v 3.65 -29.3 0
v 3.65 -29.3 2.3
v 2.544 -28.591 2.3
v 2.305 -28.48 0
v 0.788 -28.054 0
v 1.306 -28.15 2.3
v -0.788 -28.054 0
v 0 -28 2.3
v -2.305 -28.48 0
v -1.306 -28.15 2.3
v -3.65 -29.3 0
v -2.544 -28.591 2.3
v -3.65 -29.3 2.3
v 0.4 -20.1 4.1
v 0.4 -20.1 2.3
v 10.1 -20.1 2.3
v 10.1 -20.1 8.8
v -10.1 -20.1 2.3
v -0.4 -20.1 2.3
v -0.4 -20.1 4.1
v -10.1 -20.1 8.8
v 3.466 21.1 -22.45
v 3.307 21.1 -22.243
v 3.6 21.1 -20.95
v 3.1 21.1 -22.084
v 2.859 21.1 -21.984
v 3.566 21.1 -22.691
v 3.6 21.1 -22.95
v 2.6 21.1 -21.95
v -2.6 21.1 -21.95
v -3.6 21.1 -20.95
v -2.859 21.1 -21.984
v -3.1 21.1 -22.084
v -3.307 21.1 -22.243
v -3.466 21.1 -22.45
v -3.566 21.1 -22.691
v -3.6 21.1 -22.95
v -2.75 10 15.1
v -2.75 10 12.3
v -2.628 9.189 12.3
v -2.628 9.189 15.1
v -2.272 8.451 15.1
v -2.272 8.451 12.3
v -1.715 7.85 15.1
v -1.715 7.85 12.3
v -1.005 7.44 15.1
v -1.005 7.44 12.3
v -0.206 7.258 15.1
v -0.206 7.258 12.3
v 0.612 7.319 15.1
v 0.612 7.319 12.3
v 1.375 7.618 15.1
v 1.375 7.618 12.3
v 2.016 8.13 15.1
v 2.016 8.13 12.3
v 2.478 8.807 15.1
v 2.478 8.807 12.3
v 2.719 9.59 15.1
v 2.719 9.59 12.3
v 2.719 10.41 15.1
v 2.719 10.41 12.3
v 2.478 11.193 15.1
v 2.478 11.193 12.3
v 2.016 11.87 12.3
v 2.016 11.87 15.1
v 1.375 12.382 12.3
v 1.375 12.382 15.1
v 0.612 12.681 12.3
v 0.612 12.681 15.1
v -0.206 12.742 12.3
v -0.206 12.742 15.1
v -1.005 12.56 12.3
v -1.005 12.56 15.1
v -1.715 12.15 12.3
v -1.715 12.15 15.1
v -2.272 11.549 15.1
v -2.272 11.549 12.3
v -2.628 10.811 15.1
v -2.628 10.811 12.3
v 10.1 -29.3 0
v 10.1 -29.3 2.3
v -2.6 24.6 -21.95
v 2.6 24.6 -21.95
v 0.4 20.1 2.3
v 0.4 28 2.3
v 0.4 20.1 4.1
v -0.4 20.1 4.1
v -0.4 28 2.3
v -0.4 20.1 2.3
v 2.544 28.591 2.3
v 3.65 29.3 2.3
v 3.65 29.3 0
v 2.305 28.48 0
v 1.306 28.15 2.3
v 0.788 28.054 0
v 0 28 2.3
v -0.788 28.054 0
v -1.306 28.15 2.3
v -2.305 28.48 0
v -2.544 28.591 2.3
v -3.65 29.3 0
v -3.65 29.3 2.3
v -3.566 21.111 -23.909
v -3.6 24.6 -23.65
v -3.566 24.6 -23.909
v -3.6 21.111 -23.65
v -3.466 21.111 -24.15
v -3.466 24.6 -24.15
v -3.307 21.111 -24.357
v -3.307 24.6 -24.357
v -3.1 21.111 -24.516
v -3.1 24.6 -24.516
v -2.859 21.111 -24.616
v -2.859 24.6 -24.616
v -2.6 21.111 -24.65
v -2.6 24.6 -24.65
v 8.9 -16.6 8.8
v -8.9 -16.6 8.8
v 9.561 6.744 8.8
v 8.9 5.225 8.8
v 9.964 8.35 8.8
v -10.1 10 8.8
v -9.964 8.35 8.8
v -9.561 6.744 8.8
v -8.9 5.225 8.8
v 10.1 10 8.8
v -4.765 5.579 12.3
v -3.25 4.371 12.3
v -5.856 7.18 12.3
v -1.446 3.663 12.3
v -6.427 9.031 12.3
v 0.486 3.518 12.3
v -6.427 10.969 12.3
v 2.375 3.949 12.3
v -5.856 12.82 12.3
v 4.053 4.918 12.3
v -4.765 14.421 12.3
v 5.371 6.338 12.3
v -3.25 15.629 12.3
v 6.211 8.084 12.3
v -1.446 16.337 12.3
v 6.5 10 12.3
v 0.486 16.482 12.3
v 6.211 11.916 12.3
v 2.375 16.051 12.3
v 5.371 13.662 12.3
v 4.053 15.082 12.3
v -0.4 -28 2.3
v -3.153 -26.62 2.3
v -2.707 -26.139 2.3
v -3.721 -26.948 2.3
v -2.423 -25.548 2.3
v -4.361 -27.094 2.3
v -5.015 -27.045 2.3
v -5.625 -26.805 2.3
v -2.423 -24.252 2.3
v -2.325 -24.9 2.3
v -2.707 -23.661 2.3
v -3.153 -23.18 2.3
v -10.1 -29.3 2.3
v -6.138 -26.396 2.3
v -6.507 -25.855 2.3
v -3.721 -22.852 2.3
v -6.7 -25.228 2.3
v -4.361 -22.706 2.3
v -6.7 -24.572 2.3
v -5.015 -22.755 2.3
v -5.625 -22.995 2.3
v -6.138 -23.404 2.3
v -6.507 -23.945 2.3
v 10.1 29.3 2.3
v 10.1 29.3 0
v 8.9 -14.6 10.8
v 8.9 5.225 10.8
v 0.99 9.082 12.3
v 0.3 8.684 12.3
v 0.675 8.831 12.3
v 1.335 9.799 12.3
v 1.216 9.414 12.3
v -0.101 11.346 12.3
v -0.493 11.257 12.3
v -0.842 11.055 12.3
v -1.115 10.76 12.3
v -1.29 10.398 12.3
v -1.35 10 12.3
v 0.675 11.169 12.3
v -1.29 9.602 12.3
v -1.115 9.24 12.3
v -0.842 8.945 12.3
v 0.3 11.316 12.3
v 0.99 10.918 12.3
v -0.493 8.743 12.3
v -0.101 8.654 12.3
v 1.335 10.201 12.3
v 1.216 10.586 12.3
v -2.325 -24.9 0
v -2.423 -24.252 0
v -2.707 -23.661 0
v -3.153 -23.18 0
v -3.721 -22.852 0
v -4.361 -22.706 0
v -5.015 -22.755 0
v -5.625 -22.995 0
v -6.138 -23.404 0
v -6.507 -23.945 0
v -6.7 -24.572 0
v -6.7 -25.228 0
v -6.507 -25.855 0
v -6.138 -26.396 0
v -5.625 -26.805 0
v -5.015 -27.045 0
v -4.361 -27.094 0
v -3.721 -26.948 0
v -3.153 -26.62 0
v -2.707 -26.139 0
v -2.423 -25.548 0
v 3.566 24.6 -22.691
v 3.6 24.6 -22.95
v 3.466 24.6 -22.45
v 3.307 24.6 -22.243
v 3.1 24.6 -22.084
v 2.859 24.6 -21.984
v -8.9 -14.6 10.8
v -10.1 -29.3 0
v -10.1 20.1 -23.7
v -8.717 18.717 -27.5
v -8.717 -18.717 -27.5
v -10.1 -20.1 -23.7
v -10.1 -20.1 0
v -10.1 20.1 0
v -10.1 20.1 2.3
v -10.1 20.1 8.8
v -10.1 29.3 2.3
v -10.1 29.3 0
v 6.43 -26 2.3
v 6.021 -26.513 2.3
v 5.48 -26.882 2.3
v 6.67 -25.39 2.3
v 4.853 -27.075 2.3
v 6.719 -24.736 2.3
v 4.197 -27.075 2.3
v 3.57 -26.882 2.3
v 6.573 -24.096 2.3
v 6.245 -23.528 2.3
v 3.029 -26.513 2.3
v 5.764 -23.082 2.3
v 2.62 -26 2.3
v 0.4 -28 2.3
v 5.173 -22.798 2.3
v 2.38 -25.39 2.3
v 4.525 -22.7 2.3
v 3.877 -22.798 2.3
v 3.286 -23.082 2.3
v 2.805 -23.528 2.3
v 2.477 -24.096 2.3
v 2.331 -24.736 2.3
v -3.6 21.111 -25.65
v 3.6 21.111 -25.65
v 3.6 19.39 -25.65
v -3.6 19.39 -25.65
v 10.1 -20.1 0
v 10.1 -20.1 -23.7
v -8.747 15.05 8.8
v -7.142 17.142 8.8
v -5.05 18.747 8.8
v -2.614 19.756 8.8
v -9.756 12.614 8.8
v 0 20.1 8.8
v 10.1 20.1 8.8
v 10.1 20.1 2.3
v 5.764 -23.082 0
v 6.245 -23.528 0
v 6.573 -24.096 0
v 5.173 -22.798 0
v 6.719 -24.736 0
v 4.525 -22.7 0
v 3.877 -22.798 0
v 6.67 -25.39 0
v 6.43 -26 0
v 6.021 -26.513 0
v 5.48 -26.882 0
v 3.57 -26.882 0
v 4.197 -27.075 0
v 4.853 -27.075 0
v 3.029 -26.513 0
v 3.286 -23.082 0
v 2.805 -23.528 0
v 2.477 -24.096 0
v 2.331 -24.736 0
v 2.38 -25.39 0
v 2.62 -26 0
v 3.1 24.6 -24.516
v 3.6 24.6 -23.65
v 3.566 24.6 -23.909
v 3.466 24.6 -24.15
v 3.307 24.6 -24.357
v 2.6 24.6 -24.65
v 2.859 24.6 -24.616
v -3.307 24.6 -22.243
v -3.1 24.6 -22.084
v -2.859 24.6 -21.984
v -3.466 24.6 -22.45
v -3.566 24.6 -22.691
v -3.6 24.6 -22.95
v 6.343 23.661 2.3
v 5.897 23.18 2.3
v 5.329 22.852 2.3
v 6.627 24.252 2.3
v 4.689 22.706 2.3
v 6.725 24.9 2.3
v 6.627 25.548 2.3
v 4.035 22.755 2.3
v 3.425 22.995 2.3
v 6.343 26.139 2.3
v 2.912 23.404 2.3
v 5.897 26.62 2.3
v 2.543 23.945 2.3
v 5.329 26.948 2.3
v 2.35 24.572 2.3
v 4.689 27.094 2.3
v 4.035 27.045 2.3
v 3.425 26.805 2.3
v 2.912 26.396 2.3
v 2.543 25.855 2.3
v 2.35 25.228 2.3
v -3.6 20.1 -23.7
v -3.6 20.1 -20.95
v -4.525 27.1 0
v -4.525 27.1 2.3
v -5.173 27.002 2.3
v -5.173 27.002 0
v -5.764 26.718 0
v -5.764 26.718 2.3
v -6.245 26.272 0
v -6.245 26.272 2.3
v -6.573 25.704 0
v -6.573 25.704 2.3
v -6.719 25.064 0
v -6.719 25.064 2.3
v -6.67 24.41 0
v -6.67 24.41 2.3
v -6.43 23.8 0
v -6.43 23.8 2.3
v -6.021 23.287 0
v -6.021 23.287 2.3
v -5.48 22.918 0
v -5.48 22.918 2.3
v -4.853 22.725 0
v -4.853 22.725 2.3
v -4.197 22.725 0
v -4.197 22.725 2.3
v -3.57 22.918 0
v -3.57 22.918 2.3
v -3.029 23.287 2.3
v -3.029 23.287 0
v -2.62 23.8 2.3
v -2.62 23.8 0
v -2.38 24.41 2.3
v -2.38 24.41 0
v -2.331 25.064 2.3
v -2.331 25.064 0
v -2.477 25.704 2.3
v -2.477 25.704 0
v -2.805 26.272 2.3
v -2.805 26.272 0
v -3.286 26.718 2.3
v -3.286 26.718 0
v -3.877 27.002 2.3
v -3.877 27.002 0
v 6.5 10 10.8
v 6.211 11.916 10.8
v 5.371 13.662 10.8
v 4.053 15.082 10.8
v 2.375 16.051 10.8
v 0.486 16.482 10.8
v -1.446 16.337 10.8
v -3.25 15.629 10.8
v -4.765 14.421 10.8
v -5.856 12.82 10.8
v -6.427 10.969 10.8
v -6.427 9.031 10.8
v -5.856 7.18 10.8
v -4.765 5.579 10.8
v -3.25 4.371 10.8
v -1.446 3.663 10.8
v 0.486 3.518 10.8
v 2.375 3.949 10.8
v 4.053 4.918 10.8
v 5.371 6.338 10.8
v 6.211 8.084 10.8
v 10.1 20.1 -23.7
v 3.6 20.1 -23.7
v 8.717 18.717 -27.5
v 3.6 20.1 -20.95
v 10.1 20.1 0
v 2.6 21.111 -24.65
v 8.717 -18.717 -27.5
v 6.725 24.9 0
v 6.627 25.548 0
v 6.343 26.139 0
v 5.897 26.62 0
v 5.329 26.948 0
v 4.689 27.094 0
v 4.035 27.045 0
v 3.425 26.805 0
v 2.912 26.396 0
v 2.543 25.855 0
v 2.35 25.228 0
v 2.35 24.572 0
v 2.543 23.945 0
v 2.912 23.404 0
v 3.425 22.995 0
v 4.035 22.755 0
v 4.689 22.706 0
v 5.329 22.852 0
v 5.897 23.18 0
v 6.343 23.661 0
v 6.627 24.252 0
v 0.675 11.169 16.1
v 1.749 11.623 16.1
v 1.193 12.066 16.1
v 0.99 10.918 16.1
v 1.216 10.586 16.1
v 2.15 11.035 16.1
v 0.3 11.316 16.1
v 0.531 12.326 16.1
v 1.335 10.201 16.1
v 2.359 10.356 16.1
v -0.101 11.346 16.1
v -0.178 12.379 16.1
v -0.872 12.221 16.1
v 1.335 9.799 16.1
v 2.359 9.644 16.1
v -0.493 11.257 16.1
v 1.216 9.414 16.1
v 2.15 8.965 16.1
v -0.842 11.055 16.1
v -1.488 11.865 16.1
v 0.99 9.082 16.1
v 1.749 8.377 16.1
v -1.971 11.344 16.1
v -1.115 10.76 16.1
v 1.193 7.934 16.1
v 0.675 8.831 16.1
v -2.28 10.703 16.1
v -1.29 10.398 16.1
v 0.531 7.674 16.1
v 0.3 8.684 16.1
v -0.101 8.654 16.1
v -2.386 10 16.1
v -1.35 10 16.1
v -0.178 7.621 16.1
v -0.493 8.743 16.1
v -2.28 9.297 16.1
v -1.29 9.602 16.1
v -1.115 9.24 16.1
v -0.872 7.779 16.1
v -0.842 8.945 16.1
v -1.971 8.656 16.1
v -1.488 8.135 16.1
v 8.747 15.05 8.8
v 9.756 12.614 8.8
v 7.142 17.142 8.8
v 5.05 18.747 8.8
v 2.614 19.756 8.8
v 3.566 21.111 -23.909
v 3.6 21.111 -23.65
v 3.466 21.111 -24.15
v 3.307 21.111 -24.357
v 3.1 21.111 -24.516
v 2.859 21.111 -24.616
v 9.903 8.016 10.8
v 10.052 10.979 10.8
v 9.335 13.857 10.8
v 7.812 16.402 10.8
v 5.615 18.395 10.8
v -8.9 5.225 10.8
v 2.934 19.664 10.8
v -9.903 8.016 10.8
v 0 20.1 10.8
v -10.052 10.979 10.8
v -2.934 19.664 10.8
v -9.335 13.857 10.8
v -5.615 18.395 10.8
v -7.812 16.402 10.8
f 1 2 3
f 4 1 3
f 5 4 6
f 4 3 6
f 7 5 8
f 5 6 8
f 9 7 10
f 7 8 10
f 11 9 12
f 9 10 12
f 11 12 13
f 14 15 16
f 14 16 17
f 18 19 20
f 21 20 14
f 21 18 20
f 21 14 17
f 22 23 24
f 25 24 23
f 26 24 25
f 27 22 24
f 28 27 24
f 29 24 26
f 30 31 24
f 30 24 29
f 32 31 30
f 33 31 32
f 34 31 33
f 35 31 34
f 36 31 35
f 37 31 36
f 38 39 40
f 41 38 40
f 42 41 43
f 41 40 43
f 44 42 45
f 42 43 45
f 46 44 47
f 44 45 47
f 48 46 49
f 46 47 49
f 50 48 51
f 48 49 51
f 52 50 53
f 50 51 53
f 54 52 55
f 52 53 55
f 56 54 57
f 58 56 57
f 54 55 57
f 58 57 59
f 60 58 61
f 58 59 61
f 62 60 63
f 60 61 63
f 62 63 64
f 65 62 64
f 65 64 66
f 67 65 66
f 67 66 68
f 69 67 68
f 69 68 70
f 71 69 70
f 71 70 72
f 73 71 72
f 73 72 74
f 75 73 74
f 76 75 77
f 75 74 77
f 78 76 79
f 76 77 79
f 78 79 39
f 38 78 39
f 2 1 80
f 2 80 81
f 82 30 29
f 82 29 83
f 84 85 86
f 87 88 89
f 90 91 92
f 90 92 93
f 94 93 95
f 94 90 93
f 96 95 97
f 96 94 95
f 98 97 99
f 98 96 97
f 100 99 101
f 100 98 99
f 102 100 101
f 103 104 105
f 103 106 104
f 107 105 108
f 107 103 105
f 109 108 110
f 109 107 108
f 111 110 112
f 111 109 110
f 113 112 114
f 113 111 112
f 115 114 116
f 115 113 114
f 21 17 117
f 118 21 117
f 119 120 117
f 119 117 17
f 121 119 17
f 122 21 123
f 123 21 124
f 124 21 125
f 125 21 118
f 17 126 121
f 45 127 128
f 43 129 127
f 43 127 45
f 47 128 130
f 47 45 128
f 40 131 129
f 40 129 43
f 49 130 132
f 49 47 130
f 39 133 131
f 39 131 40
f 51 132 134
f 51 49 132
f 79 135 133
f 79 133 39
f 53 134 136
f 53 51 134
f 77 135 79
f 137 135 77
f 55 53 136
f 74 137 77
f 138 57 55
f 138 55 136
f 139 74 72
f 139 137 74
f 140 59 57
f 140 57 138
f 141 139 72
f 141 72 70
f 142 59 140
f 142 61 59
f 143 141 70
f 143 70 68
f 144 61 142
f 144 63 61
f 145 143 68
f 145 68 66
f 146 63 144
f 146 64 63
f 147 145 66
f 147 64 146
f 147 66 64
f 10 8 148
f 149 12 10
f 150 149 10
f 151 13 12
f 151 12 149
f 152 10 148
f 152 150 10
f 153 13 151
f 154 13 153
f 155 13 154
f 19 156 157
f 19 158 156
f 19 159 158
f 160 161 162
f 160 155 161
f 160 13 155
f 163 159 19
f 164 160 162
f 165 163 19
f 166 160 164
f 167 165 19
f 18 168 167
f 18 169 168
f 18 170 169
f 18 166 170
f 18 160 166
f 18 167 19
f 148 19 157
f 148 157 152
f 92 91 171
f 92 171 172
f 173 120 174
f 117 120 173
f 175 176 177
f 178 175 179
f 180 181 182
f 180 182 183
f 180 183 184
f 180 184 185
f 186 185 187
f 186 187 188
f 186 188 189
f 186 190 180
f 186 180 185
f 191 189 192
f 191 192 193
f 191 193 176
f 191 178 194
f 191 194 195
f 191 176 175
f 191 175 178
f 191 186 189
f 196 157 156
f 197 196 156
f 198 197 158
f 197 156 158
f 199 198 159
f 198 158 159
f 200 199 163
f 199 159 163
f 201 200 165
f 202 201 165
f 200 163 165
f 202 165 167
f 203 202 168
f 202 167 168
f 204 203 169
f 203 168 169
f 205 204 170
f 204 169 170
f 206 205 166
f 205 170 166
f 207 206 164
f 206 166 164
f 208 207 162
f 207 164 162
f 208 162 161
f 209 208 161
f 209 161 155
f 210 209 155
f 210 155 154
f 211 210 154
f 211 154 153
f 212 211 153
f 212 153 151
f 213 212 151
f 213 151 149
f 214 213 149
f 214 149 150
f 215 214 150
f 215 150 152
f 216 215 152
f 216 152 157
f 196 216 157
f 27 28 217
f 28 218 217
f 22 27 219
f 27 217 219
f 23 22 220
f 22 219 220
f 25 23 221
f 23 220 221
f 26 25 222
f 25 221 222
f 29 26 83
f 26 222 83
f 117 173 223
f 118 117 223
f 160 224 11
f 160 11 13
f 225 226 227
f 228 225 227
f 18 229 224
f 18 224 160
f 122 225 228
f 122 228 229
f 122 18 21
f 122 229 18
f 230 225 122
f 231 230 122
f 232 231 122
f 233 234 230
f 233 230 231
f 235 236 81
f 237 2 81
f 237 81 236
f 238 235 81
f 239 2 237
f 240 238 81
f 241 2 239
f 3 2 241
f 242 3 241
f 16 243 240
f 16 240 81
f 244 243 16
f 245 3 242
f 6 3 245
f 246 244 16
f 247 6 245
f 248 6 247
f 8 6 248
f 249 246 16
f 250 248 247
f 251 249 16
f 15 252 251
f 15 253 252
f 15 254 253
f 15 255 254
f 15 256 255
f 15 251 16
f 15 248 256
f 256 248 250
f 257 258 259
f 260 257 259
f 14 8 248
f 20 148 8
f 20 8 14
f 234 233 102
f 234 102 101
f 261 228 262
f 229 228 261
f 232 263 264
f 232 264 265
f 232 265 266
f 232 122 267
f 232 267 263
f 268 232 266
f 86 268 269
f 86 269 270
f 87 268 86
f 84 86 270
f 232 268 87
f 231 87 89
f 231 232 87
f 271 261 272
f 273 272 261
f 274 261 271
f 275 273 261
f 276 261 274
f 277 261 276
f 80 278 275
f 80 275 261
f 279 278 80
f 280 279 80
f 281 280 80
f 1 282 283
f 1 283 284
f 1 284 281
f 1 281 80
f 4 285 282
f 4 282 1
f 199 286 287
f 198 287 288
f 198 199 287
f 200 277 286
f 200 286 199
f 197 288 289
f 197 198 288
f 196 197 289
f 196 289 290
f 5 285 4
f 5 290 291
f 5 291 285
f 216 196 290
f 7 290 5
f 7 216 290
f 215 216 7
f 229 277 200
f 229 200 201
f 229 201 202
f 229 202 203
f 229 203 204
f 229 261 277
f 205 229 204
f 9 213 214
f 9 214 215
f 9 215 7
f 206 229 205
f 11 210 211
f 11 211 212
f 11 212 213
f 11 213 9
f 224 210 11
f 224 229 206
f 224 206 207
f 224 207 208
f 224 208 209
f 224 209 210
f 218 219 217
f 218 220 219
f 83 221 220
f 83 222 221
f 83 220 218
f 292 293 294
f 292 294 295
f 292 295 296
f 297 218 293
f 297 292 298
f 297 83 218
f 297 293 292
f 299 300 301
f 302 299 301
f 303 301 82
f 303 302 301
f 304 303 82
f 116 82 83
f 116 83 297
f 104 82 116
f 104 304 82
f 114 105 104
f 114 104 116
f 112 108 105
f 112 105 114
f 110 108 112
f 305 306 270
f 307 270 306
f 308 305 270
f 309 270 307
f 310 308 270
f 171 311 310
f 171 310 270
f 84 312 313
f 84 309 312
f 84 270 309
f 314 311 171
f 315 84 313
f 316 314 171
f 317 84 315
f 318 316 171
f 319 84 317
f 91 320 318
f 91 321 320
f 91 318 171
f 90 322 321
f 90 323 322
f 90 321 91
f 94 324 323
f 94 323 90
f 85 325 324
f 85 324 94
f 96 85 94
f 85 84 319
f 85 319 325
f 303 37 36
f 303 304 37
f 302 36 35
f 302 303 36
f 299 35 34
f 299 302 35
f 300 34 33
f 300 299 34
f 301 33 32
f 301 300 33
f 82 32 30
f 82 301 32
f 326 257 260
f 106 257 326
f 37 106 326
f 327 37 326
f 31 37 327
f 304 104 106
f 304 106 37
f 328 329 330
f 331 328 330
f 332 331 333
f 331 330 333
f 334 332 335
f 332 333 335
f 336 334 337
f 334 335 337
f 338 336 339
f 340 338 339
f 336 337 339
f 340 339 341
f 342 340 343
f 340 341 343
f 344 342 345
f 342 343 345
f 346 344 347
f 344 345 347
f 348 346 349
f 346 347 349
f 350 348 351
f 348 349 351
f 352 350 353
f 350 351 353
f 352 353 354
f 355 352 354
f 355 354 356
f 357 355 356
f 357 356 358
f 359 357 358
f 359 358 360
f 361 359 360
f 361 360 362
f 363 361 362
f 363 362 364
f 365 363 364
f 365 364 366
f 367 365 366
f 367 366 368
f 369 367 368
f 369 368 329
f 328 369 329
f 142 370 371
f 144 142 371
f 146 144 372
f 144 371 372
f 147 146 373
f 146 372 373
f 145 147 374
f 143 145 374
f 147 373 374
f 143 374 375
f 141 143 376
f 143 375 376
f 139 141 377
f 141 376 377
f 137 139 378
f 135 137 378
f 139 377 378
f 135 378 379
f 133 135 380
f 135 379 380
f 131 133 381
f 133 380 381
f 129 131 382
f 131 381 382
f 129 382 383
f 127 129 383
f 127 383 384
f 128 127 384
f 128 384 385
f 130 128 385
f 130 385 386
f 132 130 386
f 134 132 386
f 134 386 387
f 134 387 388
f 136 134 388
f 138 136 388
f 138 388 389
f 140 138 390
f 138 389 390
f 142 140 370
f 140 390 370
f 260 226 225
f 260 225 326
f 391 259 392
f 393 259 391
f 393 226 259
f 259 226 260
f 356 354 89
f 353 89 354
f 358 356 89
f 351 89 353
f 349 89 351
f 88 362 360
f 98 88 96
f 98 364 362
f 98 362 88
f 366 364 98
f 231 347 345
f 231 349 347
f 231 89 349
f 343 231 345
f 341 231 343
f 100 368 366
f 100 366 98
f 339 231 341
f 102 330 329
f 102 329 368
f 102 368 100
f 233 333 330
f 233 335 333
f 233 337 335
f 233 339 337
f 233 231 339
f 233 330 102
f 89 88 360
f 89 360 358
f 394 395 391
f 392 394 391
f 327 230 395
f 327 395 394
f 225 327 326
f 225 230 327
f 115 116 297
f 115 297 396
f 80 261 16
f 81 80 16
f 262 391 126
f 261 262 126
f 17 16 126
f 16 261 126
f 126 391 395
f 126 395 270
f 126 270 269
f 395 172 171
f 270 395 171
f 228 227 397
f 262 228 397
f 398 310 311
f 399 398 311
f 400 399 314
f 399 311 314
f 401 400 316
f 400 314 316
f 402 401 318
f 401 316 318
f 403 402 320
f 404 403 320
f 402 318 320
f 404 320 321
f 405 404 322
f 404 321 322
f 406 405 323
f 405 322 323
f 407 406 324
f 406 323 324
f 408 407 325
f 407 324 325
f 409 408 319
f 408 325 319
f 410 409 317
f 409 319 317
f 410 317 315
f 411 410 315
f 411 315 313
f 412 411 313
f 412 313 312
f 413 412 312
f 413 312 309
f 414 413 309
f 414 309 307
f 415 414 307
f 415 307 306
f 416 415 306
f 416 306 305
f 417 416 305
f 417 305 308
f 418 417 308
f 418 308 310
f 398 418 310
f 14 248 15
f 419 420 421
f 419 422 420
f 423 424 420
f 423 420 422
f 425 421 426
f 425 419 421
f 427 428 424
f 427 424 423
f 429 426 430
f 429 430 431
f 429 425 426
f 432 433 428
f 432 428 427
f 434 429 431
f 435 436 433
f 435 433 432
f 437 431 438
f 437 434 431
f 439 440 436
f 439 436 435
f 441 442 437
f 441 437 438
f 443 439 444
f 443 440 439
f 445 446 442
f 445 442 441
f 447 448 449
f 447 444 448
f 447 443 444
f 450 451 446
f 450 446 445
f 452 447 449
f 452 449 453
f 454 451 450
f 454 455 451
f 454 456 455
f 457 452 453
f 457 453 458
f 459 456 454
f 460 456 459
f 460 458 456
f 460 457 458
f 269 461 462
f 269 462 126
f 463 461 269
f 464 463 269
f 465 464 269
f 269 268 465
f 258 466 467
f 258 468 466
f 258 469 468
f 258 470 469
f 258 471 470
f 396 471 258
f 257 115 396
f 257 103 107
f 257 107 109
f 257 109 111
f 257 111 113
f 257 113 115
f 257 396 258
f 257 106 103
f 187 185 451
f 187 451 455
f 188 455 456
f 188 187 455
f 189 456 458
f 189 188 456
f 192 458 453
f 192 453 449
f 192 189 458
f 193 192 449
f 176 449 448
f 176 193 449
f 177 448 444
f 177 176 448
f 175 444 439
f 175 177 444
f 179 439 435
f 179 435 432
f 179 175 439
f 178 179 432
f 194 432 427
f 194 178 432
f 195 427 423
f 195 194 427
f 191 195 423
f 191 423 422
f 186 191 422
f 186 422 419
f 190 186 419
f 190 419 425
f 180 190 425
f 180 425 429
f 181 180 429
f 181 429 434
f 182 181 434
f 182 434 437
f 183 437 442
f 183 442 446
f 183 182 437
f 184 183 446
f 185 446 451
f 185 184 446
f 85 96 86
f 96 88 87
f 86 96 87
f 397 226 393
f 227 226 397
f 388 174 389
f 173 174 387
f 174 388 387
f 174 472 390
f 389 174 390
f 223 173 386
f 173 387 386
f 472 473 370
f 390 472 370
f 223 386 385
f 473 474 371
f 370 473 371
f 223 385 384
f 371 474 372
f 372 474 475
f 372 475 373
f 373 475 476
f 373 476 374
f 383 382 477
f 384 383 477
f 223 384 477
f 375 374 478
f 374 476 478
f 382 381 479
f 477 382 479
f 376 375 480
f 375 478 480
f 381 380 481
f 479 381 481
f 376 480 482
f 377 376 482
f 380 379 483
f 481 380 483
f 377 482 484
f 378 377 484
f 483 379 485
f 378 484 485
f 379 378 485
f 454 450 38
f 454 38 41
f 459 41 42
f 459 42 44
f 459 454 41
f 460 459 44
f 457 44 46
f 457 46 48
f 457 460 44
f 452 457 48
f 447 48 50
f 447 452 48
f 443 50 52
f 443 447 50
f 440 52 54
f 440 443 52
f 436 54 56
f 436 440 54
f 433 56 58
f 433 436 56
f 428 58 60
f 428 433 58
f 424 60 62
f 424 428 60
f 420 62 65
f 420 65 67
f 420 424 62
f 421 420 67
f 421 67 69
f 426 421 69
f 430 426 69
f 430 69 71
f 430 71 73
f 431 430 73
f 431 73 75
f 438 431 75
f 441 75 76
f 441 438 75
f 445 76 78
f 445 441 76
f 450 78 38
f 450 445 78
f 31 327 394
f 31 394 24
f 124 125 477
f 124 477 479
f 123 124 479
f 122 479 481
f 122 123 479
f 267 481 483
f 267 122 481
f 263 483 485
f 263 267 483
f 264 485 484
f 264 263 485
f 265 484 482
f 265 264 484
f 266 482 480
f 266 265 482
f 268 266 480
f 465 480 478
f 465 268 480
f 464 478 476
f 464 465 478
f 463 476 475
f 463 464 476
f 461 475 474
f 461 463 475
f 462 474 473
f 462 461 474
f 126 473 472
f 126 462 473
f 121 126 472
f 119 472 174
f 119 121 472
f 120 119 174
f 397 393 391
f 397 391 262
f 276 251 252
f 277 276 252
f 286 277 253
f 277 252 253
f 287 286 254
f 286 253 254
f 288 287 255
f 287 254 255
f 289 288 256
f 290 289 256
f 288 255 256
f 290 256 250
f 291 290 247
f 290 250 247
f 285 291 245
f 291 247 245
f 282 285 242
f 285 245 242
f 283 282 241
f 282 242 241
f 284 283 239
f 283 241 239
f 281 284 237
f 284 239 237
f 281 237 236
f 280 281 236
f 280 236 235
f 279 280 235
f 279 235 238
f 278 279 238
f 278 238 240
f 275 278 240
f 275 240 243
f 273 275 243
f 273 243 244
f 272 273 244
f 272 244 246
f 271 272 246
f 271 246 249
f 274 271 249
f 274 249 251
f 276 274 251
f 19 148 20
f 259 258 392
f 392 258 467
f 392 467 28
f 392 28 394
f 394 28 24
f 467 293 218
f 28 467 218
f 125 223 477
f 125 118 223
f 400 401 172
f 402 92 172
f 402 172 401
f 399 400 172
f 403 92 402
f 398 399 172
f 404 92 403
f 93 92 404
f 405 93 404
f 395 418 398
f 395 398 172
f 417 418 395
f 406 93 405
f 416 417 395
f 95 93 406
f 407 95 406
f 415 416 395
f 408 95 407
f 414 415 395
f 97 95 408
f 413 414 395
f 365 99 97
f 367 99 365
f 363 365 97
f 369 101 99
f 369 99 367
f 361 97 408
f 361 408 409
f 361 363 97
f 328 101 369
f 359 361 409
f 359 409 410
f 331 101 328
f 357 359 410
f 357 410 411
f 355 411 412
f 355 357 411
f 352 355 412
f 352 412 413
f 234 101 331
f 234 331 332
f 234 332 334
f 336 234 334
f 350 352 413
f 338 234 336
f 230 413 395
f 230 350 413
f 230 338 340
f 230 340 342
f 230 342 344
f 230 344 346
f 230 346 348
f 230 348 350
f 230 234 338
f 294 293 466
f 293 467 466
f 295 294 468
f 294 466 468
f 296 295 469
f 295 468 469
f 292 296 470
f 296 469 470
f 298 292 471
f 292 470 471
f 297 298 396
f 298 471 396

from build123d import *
from OCP.BRepFilletAPI import BRepFilletAPI_MakeChamfer

# Parameters (mm, degrees)
BOSS_EXTRUDE1_DEPTH      = 10.1
BOSS_EXTRUDE1_DEPTH_BACK = 10.1
CUT_EXTRUDE1_REACH       = 44.995
SKETCH2_R                = 2.2
RIB3_REACH               = 43.434
SKETCH3_WALL_W           = 92.969832662
SKETCH3_WALL_H           = 0.8
BOSS_EXTRUDE2_DEPTH      = 2
CHAMFER1_SIZE            = 2
SKETCH5_R                = 6.5
BOSS_EXTRUDE3_DEPTH      = 1.5
CHAMFER2_SIZE            = 3.8
CHAMFER2_SIZE2           = 1.38308689
BOSS_EXTRUDE4_DEPTH      = 3.6
BOSS_EXTRUDE4_DEPTH_BACK = 3.6
FILLET2_R                = 1
SKETCH7_R                = 2.75
SKETCH7_R_2              = 1.35
BOSS_EXTRUDE5_DEPTH      = 3.8
CHAMFER3_SIZE            = 1
CHAMFER3_SIZE2           = 0.363970234


with BuildPart() as part:
    # Sketch1 → Boss-Extrude1 (new, two sides: drawn at the far end of the back side and taken through both)
    with BuildSketch(Plane(origin=(0, 0, 0), x_dir=(0, 0, -1), z_dir=(1, 0, 0)).offset(-BOSS_EXTRUDE1_DEPTH_BACK)):
        Polygon((-8.8, -20.1), (-8.8, 20.1), (-2.3, 20.1), (-2.3, 29.3), (0, 29.3), (0, 20.1), (27.5, 20.1), (27.5, -20.1), (0, -20.1), (0, -29.3), (-2.3, -29.3), (-2.3, -20.1), align=None)
    extrude(amount=BOSS_EXTRUDE1_DEPTH + BOSS_EXTRUDE1_DEPTH_BACK)

    # Sketch2 → Cut-Extrude1 (cut, up to next)
    with BuildSketch(Plane.XY.offset(2.3), mode=Mode.PRIVATE) as cut_extrude1_sk1:
        with Locations((4.525, 24.9)):
            Circle(SKETCH2_R)
    cut_extrude1_tool1 = extrude(cut_extrude1_sk1.sketch, amount=-CUT_EXTRUDE1_REACH, mode=Mode.PRIVATE) & part.part
    # Sketch2 → Cut-Extrude1 (cut, up to next)
    with BuildSketch(Plane.XY.offset(2.3), mode=Mode.PRIVATE) as cut_extrude1_sk2:
        with Locations(Location((-4.525, 24.9, 0), (0, 0, 90))):
            Circle(SKETCH2_R)
    cut_extrude1_tool2 = extrude(cut_extrude1_sk2.sketch, amount=-CUT_EXTRUDE1_REACH, mode=Mode.PRIVATE) & part.part
    # Sketch2 → Cut-Extrude1 (cut, up to next)
    with BuildSketch(Plane.XY.offset(2.3), mode=Mode.PRIVATE) as cut_extrude1_sk3:
        with Locations((-4.525, -24.9)):
            Circle(SKETCH2_R)
    cut_extrude1_tool3 = extrude(cut_extrude1_sk3.sketch, amount=-CUT_EXTRUDE1_REACH, mode=Mode.PRIVATE) & part.part
    # Sketch2 → Cut-Extrude1 (cut, up to next)
    with BuildSketch(Plane.XY.offset(2.3), mode=Mode.PRIVATE) as cut_extrude1_sk4:
        with Locations(Location((4.525, -24.9, 0), (0, 0, 90))):
            Circle(SKETCH2_R)
    cut_extrude1_tool4 = extrude(cut_extrude1_sk4.sketch, amount=-CUT_EXTRUDE1_REACH, mode=Mode.PRIVATE) & part.part
    # Sketch2 → Cut-Extrude1 (cut, up to next)
    with BuildSketch(Plane.XY.offset(2.3), mode=Mode.PRIVATE) as cut_extrude1_sk5:
        with BuildLine():
            Line((-3.65, 29.3), (3.65, 29.3))
            ThreePointArc((3.65, 29.3), (0, 28), (-3.65, 29.3))
        make_face()
    cut_extrude1_tool5 = extrude(cut_extrude1_sk5.sketch, amount=-CUT_EXTRUDE1_REACH, mode=Mode.PRIVATE) & part.part
    # Sketch2 → Cut-Extrude1 (cut, up to next)
    with BuildSketch(Plane.XY.offset(2.3), mode=Mode.PRIVATE) as cut_extrude1_sk6:
        with BuildLine():
            Line((-3.65, -29.3), (3.65, -29.3))
            ThreePointArc((3.65, -29.3), (0, -28), (-3.65, -29.3))
        make_face()
    cut_extrude1_tool6 = extrude(cut_extrude1_sk6.sketch, amount=-CUT_EXTRUDE1_REACH, mode=Mode.PRIVATE) & part.part
    add(cut_extrude1_tool1.solids().sort_by_distance((4.525, 24.9, 2.3))[0], mode=Mode.SUBTRACT)
    add(cut_extrude1_tool2.solids().sort_by_distance((-4.525, 24.9, 2.3))[0], mode=Mode.SUBTRACT)
    add(cut_extrude1_tool3.solids().sort_by_distance((-4.525, -24.9, 2.3))[0], mode=Mode.SUBTRACT)
    add(cut_extrude1_tool4.solids().sort_by_distance((4.525, -24.9, 2.3))[0], mode=Mode.SUBTRACT)
    add(cut_extrude1_tool5.solids().sort_by_distance((0, 28.774631, 2.3))[0], mode=Mode.SUBTRACT)
    add(cut_extrude1_tool6.solids().sort_by_distance((0, -28.774631, 2.3))[0], mode=Mode.SUBTRACT)

    # Sketch3 wall → Rib3 (add, up to next)
    with BuildSketch(Plane(origin=(0, 24.05, 3.2), x_dir=(0, -0.975011472973, 0.222154512829), z_dir=(0, -0.222154512829, -0.975011472973)), mode=Mode.PRIVATE) as rib3_sk1:
        Rectangle(SKETCH3_WALL_W, SKETCH3_WALL_H)
    rib3_tool1 = extrude(rib3_sk1.sketch, amount=RIB3_REACH, mode=Mode.PRIVATE) - part.part
    rib3 = rib3_tool1.solids().sort_by_distance((0, 24.05, 3.2))[0]
    add(rib3)

    # Mirror1: Rib3 across plane
    add(rib3.mirror(Plane.ZX))

    # Sketch4 → Boss-Extrude2 (add)
    with BuildSketch(Plane.XY.offset(8.8)):
        with BuildLine():
            Line((8.9, 5.225065445), (8.9, -16.6))
            Line((8.9, -16.6), (-8.9, -16.6))
            Line((-8.9, -16.6), (-8.9, 5.225065445))
            ThreePointArc((-8.9, 5.225065445), (0, 20.1), (8.9, 5.225065445))
        make_face()
    extrude(amount=BOSS_EXTRUDE2_DEPTH)

    # Chamfer1
    chamfer1_edges = [part.edges().sort_by_distance(p)[0] for p in [
        (0, -16.6, 10.8),
    ]]
    chamfer(chamfer1_edges, length=CHAMFER1_SIZE - 0.0001)  # a hair under: the kernel refuses the full size

    # Sketch5 → Boss-Extrude3 (add)
    with BuildSketch(Plane.XY.offset(10.8)):
        with Locations((0, 10)):
            Circle(SKETCH5_R)
    extrude(amount=BOSS_EXTRUDE3_DEPTH)

    # Chamfer2: one chamfer whose edges measure the first distance from different faces: ONE call of the kernel's chamfer builder (chamfer() names one face for all edges)
    chamfer2_edges_1 = [part.edges().sort_by_distance(p)[0] for p in [
        (-10.1, 0, -27.5),
    ]]
    chamfer2_side_1 = [part.faces().sort_by_distance(p)[0] for p in [
        (-10.1, 0, -9.054071711),
    ]]
    chamfer2_edges_2 = [part.edges().sort_by_distance(p)[0] for p in [
        (0, 20.1, -27.5),
    ]]
    chamfer2_side_2 = [part.faces().sort_by_distance(p)[0] for p in [
        (0, 20.1, -13.75),
    ]]
    chamfer2_edges_3 = [part.edges().sort_by_distance(p)[0] for p in [
        (0, -20.1, -27.5),
    ]]
    chamfer2_side_3 = [part.faces().sort_by_distance(p)[0] for p in [
        (0, -20.1, -13.75),
    ]]
    chamfer2_edges_4 = [part.edges().sort_by_distance(p)[0] for p in [
        (10.1, 0, -27.5),
    ]]
    chamfer2_side_4 = [part.faces().sort_by_distance(p)[0] for p in [
        (10.1, 0, -9.054071711),
    ]]
    chamfer2 = BRepFilletAPI_MakeChamfer(part.part.solid().wrapped)
    for e in chamfer2_edges_1:
        chamfer2.Add(CHAMFER2_SIZE, CHAMFER2_SIZE2, e.wrapped, chamfer2_side_1[0].wrapped)  # the first distance lies on this face
    for e in chamfer2_edges_2:
        chamfer2.Add(CHAMFER2_SIZE, CHAMFER2_SIZE2, e.wrapped, chamfer2_side_2[0].wrapped)  # the first distance lies on this face
    for e in chamfer2_edges_3:
        chamfer2.Add(CHAMFER2_SIZE, CHAMFER2_SIZE2, e.wrapped, chamfer2_side_3[0].wrapped)  # the first distance lies on this face
    for e in chamfer2_edges_4:
        chamfer2.Add(CHAMFER2_SIZE, CHAMFER2_SIZE2, e.wrapped, chamfer2_side_4[0].wrapped)  # the first distance lies on this face
    add(Compound.cast(chamfer2.Shape()), mode=Mode.REPLACE)

    # Sketch6 → Boss-Extrude4 (add, two sides: drawn at the far end of the back side and taken through both)
    with BuildSketch(Plane(origin=(0, 0, 0), x_dir=(0, 0, -1), z_dir=(1, 0, 0)).offset(-BOSS_EXTRUDE4_DEPTH_BACK)):
        Polygon((25.65, 18.71691311), (20.95, 18.71691311), (20.95, 21.1), (21.95, 21.1), (21.95, 24.6), (24.65, 24.6), (24.65, 21.110599186), (25.65, 21.110599186), align=None)
    extrude(amount=BOSS_EXTRUDE4_DEPTH + BOSS_EXTRUDE4_DEPTH_BACK)

    # Fillet2
    fillet2_edges = [part.edges().sort_by_distance(p)[0] for p in [
        (-3.6, 22.85, -21.95),
        (-3.6, 22.855299593, -24.65),
        (3.6, 22.855299593, -24.65),
        (3.6, 22.85, -21.95),
    ]]
    fillet(fillet2_edges, radius=FILLET2_R)

    # Sketch7 → Boss-Extrude5 (add)
    with BuildSketch(Plane.XY.offset(12.3)):
        with Locations(Location((0, 10, 0), (0, 0, 180))):
            Circle(SKETCH7_R)
        with Locations(Location((0, 10, 0), (0, 0, 180))):
            Circle(SKETCH7_R_2, mode=Mode.SUBTRACT)
    extrude(amount=BOSS_EXTRUDE5_DEPTH)

    # Chamfer3
    chamfer3_edges = [part.edges().sort_by_distance(p)[0] for p in [
        (2.75, 10, 16.1),
    ]]
    chamfer3_side = [part.faces().sort_by_distance(p)[0] for p in [
        (2.75, 10, 14.2),
    ]]
    chamfer(chamfer3_edges, length=CHAMFER3_SIZE, length2=CHAMFER3_SIZE2, reference=chamfer3_side[0])


solid = part.part
